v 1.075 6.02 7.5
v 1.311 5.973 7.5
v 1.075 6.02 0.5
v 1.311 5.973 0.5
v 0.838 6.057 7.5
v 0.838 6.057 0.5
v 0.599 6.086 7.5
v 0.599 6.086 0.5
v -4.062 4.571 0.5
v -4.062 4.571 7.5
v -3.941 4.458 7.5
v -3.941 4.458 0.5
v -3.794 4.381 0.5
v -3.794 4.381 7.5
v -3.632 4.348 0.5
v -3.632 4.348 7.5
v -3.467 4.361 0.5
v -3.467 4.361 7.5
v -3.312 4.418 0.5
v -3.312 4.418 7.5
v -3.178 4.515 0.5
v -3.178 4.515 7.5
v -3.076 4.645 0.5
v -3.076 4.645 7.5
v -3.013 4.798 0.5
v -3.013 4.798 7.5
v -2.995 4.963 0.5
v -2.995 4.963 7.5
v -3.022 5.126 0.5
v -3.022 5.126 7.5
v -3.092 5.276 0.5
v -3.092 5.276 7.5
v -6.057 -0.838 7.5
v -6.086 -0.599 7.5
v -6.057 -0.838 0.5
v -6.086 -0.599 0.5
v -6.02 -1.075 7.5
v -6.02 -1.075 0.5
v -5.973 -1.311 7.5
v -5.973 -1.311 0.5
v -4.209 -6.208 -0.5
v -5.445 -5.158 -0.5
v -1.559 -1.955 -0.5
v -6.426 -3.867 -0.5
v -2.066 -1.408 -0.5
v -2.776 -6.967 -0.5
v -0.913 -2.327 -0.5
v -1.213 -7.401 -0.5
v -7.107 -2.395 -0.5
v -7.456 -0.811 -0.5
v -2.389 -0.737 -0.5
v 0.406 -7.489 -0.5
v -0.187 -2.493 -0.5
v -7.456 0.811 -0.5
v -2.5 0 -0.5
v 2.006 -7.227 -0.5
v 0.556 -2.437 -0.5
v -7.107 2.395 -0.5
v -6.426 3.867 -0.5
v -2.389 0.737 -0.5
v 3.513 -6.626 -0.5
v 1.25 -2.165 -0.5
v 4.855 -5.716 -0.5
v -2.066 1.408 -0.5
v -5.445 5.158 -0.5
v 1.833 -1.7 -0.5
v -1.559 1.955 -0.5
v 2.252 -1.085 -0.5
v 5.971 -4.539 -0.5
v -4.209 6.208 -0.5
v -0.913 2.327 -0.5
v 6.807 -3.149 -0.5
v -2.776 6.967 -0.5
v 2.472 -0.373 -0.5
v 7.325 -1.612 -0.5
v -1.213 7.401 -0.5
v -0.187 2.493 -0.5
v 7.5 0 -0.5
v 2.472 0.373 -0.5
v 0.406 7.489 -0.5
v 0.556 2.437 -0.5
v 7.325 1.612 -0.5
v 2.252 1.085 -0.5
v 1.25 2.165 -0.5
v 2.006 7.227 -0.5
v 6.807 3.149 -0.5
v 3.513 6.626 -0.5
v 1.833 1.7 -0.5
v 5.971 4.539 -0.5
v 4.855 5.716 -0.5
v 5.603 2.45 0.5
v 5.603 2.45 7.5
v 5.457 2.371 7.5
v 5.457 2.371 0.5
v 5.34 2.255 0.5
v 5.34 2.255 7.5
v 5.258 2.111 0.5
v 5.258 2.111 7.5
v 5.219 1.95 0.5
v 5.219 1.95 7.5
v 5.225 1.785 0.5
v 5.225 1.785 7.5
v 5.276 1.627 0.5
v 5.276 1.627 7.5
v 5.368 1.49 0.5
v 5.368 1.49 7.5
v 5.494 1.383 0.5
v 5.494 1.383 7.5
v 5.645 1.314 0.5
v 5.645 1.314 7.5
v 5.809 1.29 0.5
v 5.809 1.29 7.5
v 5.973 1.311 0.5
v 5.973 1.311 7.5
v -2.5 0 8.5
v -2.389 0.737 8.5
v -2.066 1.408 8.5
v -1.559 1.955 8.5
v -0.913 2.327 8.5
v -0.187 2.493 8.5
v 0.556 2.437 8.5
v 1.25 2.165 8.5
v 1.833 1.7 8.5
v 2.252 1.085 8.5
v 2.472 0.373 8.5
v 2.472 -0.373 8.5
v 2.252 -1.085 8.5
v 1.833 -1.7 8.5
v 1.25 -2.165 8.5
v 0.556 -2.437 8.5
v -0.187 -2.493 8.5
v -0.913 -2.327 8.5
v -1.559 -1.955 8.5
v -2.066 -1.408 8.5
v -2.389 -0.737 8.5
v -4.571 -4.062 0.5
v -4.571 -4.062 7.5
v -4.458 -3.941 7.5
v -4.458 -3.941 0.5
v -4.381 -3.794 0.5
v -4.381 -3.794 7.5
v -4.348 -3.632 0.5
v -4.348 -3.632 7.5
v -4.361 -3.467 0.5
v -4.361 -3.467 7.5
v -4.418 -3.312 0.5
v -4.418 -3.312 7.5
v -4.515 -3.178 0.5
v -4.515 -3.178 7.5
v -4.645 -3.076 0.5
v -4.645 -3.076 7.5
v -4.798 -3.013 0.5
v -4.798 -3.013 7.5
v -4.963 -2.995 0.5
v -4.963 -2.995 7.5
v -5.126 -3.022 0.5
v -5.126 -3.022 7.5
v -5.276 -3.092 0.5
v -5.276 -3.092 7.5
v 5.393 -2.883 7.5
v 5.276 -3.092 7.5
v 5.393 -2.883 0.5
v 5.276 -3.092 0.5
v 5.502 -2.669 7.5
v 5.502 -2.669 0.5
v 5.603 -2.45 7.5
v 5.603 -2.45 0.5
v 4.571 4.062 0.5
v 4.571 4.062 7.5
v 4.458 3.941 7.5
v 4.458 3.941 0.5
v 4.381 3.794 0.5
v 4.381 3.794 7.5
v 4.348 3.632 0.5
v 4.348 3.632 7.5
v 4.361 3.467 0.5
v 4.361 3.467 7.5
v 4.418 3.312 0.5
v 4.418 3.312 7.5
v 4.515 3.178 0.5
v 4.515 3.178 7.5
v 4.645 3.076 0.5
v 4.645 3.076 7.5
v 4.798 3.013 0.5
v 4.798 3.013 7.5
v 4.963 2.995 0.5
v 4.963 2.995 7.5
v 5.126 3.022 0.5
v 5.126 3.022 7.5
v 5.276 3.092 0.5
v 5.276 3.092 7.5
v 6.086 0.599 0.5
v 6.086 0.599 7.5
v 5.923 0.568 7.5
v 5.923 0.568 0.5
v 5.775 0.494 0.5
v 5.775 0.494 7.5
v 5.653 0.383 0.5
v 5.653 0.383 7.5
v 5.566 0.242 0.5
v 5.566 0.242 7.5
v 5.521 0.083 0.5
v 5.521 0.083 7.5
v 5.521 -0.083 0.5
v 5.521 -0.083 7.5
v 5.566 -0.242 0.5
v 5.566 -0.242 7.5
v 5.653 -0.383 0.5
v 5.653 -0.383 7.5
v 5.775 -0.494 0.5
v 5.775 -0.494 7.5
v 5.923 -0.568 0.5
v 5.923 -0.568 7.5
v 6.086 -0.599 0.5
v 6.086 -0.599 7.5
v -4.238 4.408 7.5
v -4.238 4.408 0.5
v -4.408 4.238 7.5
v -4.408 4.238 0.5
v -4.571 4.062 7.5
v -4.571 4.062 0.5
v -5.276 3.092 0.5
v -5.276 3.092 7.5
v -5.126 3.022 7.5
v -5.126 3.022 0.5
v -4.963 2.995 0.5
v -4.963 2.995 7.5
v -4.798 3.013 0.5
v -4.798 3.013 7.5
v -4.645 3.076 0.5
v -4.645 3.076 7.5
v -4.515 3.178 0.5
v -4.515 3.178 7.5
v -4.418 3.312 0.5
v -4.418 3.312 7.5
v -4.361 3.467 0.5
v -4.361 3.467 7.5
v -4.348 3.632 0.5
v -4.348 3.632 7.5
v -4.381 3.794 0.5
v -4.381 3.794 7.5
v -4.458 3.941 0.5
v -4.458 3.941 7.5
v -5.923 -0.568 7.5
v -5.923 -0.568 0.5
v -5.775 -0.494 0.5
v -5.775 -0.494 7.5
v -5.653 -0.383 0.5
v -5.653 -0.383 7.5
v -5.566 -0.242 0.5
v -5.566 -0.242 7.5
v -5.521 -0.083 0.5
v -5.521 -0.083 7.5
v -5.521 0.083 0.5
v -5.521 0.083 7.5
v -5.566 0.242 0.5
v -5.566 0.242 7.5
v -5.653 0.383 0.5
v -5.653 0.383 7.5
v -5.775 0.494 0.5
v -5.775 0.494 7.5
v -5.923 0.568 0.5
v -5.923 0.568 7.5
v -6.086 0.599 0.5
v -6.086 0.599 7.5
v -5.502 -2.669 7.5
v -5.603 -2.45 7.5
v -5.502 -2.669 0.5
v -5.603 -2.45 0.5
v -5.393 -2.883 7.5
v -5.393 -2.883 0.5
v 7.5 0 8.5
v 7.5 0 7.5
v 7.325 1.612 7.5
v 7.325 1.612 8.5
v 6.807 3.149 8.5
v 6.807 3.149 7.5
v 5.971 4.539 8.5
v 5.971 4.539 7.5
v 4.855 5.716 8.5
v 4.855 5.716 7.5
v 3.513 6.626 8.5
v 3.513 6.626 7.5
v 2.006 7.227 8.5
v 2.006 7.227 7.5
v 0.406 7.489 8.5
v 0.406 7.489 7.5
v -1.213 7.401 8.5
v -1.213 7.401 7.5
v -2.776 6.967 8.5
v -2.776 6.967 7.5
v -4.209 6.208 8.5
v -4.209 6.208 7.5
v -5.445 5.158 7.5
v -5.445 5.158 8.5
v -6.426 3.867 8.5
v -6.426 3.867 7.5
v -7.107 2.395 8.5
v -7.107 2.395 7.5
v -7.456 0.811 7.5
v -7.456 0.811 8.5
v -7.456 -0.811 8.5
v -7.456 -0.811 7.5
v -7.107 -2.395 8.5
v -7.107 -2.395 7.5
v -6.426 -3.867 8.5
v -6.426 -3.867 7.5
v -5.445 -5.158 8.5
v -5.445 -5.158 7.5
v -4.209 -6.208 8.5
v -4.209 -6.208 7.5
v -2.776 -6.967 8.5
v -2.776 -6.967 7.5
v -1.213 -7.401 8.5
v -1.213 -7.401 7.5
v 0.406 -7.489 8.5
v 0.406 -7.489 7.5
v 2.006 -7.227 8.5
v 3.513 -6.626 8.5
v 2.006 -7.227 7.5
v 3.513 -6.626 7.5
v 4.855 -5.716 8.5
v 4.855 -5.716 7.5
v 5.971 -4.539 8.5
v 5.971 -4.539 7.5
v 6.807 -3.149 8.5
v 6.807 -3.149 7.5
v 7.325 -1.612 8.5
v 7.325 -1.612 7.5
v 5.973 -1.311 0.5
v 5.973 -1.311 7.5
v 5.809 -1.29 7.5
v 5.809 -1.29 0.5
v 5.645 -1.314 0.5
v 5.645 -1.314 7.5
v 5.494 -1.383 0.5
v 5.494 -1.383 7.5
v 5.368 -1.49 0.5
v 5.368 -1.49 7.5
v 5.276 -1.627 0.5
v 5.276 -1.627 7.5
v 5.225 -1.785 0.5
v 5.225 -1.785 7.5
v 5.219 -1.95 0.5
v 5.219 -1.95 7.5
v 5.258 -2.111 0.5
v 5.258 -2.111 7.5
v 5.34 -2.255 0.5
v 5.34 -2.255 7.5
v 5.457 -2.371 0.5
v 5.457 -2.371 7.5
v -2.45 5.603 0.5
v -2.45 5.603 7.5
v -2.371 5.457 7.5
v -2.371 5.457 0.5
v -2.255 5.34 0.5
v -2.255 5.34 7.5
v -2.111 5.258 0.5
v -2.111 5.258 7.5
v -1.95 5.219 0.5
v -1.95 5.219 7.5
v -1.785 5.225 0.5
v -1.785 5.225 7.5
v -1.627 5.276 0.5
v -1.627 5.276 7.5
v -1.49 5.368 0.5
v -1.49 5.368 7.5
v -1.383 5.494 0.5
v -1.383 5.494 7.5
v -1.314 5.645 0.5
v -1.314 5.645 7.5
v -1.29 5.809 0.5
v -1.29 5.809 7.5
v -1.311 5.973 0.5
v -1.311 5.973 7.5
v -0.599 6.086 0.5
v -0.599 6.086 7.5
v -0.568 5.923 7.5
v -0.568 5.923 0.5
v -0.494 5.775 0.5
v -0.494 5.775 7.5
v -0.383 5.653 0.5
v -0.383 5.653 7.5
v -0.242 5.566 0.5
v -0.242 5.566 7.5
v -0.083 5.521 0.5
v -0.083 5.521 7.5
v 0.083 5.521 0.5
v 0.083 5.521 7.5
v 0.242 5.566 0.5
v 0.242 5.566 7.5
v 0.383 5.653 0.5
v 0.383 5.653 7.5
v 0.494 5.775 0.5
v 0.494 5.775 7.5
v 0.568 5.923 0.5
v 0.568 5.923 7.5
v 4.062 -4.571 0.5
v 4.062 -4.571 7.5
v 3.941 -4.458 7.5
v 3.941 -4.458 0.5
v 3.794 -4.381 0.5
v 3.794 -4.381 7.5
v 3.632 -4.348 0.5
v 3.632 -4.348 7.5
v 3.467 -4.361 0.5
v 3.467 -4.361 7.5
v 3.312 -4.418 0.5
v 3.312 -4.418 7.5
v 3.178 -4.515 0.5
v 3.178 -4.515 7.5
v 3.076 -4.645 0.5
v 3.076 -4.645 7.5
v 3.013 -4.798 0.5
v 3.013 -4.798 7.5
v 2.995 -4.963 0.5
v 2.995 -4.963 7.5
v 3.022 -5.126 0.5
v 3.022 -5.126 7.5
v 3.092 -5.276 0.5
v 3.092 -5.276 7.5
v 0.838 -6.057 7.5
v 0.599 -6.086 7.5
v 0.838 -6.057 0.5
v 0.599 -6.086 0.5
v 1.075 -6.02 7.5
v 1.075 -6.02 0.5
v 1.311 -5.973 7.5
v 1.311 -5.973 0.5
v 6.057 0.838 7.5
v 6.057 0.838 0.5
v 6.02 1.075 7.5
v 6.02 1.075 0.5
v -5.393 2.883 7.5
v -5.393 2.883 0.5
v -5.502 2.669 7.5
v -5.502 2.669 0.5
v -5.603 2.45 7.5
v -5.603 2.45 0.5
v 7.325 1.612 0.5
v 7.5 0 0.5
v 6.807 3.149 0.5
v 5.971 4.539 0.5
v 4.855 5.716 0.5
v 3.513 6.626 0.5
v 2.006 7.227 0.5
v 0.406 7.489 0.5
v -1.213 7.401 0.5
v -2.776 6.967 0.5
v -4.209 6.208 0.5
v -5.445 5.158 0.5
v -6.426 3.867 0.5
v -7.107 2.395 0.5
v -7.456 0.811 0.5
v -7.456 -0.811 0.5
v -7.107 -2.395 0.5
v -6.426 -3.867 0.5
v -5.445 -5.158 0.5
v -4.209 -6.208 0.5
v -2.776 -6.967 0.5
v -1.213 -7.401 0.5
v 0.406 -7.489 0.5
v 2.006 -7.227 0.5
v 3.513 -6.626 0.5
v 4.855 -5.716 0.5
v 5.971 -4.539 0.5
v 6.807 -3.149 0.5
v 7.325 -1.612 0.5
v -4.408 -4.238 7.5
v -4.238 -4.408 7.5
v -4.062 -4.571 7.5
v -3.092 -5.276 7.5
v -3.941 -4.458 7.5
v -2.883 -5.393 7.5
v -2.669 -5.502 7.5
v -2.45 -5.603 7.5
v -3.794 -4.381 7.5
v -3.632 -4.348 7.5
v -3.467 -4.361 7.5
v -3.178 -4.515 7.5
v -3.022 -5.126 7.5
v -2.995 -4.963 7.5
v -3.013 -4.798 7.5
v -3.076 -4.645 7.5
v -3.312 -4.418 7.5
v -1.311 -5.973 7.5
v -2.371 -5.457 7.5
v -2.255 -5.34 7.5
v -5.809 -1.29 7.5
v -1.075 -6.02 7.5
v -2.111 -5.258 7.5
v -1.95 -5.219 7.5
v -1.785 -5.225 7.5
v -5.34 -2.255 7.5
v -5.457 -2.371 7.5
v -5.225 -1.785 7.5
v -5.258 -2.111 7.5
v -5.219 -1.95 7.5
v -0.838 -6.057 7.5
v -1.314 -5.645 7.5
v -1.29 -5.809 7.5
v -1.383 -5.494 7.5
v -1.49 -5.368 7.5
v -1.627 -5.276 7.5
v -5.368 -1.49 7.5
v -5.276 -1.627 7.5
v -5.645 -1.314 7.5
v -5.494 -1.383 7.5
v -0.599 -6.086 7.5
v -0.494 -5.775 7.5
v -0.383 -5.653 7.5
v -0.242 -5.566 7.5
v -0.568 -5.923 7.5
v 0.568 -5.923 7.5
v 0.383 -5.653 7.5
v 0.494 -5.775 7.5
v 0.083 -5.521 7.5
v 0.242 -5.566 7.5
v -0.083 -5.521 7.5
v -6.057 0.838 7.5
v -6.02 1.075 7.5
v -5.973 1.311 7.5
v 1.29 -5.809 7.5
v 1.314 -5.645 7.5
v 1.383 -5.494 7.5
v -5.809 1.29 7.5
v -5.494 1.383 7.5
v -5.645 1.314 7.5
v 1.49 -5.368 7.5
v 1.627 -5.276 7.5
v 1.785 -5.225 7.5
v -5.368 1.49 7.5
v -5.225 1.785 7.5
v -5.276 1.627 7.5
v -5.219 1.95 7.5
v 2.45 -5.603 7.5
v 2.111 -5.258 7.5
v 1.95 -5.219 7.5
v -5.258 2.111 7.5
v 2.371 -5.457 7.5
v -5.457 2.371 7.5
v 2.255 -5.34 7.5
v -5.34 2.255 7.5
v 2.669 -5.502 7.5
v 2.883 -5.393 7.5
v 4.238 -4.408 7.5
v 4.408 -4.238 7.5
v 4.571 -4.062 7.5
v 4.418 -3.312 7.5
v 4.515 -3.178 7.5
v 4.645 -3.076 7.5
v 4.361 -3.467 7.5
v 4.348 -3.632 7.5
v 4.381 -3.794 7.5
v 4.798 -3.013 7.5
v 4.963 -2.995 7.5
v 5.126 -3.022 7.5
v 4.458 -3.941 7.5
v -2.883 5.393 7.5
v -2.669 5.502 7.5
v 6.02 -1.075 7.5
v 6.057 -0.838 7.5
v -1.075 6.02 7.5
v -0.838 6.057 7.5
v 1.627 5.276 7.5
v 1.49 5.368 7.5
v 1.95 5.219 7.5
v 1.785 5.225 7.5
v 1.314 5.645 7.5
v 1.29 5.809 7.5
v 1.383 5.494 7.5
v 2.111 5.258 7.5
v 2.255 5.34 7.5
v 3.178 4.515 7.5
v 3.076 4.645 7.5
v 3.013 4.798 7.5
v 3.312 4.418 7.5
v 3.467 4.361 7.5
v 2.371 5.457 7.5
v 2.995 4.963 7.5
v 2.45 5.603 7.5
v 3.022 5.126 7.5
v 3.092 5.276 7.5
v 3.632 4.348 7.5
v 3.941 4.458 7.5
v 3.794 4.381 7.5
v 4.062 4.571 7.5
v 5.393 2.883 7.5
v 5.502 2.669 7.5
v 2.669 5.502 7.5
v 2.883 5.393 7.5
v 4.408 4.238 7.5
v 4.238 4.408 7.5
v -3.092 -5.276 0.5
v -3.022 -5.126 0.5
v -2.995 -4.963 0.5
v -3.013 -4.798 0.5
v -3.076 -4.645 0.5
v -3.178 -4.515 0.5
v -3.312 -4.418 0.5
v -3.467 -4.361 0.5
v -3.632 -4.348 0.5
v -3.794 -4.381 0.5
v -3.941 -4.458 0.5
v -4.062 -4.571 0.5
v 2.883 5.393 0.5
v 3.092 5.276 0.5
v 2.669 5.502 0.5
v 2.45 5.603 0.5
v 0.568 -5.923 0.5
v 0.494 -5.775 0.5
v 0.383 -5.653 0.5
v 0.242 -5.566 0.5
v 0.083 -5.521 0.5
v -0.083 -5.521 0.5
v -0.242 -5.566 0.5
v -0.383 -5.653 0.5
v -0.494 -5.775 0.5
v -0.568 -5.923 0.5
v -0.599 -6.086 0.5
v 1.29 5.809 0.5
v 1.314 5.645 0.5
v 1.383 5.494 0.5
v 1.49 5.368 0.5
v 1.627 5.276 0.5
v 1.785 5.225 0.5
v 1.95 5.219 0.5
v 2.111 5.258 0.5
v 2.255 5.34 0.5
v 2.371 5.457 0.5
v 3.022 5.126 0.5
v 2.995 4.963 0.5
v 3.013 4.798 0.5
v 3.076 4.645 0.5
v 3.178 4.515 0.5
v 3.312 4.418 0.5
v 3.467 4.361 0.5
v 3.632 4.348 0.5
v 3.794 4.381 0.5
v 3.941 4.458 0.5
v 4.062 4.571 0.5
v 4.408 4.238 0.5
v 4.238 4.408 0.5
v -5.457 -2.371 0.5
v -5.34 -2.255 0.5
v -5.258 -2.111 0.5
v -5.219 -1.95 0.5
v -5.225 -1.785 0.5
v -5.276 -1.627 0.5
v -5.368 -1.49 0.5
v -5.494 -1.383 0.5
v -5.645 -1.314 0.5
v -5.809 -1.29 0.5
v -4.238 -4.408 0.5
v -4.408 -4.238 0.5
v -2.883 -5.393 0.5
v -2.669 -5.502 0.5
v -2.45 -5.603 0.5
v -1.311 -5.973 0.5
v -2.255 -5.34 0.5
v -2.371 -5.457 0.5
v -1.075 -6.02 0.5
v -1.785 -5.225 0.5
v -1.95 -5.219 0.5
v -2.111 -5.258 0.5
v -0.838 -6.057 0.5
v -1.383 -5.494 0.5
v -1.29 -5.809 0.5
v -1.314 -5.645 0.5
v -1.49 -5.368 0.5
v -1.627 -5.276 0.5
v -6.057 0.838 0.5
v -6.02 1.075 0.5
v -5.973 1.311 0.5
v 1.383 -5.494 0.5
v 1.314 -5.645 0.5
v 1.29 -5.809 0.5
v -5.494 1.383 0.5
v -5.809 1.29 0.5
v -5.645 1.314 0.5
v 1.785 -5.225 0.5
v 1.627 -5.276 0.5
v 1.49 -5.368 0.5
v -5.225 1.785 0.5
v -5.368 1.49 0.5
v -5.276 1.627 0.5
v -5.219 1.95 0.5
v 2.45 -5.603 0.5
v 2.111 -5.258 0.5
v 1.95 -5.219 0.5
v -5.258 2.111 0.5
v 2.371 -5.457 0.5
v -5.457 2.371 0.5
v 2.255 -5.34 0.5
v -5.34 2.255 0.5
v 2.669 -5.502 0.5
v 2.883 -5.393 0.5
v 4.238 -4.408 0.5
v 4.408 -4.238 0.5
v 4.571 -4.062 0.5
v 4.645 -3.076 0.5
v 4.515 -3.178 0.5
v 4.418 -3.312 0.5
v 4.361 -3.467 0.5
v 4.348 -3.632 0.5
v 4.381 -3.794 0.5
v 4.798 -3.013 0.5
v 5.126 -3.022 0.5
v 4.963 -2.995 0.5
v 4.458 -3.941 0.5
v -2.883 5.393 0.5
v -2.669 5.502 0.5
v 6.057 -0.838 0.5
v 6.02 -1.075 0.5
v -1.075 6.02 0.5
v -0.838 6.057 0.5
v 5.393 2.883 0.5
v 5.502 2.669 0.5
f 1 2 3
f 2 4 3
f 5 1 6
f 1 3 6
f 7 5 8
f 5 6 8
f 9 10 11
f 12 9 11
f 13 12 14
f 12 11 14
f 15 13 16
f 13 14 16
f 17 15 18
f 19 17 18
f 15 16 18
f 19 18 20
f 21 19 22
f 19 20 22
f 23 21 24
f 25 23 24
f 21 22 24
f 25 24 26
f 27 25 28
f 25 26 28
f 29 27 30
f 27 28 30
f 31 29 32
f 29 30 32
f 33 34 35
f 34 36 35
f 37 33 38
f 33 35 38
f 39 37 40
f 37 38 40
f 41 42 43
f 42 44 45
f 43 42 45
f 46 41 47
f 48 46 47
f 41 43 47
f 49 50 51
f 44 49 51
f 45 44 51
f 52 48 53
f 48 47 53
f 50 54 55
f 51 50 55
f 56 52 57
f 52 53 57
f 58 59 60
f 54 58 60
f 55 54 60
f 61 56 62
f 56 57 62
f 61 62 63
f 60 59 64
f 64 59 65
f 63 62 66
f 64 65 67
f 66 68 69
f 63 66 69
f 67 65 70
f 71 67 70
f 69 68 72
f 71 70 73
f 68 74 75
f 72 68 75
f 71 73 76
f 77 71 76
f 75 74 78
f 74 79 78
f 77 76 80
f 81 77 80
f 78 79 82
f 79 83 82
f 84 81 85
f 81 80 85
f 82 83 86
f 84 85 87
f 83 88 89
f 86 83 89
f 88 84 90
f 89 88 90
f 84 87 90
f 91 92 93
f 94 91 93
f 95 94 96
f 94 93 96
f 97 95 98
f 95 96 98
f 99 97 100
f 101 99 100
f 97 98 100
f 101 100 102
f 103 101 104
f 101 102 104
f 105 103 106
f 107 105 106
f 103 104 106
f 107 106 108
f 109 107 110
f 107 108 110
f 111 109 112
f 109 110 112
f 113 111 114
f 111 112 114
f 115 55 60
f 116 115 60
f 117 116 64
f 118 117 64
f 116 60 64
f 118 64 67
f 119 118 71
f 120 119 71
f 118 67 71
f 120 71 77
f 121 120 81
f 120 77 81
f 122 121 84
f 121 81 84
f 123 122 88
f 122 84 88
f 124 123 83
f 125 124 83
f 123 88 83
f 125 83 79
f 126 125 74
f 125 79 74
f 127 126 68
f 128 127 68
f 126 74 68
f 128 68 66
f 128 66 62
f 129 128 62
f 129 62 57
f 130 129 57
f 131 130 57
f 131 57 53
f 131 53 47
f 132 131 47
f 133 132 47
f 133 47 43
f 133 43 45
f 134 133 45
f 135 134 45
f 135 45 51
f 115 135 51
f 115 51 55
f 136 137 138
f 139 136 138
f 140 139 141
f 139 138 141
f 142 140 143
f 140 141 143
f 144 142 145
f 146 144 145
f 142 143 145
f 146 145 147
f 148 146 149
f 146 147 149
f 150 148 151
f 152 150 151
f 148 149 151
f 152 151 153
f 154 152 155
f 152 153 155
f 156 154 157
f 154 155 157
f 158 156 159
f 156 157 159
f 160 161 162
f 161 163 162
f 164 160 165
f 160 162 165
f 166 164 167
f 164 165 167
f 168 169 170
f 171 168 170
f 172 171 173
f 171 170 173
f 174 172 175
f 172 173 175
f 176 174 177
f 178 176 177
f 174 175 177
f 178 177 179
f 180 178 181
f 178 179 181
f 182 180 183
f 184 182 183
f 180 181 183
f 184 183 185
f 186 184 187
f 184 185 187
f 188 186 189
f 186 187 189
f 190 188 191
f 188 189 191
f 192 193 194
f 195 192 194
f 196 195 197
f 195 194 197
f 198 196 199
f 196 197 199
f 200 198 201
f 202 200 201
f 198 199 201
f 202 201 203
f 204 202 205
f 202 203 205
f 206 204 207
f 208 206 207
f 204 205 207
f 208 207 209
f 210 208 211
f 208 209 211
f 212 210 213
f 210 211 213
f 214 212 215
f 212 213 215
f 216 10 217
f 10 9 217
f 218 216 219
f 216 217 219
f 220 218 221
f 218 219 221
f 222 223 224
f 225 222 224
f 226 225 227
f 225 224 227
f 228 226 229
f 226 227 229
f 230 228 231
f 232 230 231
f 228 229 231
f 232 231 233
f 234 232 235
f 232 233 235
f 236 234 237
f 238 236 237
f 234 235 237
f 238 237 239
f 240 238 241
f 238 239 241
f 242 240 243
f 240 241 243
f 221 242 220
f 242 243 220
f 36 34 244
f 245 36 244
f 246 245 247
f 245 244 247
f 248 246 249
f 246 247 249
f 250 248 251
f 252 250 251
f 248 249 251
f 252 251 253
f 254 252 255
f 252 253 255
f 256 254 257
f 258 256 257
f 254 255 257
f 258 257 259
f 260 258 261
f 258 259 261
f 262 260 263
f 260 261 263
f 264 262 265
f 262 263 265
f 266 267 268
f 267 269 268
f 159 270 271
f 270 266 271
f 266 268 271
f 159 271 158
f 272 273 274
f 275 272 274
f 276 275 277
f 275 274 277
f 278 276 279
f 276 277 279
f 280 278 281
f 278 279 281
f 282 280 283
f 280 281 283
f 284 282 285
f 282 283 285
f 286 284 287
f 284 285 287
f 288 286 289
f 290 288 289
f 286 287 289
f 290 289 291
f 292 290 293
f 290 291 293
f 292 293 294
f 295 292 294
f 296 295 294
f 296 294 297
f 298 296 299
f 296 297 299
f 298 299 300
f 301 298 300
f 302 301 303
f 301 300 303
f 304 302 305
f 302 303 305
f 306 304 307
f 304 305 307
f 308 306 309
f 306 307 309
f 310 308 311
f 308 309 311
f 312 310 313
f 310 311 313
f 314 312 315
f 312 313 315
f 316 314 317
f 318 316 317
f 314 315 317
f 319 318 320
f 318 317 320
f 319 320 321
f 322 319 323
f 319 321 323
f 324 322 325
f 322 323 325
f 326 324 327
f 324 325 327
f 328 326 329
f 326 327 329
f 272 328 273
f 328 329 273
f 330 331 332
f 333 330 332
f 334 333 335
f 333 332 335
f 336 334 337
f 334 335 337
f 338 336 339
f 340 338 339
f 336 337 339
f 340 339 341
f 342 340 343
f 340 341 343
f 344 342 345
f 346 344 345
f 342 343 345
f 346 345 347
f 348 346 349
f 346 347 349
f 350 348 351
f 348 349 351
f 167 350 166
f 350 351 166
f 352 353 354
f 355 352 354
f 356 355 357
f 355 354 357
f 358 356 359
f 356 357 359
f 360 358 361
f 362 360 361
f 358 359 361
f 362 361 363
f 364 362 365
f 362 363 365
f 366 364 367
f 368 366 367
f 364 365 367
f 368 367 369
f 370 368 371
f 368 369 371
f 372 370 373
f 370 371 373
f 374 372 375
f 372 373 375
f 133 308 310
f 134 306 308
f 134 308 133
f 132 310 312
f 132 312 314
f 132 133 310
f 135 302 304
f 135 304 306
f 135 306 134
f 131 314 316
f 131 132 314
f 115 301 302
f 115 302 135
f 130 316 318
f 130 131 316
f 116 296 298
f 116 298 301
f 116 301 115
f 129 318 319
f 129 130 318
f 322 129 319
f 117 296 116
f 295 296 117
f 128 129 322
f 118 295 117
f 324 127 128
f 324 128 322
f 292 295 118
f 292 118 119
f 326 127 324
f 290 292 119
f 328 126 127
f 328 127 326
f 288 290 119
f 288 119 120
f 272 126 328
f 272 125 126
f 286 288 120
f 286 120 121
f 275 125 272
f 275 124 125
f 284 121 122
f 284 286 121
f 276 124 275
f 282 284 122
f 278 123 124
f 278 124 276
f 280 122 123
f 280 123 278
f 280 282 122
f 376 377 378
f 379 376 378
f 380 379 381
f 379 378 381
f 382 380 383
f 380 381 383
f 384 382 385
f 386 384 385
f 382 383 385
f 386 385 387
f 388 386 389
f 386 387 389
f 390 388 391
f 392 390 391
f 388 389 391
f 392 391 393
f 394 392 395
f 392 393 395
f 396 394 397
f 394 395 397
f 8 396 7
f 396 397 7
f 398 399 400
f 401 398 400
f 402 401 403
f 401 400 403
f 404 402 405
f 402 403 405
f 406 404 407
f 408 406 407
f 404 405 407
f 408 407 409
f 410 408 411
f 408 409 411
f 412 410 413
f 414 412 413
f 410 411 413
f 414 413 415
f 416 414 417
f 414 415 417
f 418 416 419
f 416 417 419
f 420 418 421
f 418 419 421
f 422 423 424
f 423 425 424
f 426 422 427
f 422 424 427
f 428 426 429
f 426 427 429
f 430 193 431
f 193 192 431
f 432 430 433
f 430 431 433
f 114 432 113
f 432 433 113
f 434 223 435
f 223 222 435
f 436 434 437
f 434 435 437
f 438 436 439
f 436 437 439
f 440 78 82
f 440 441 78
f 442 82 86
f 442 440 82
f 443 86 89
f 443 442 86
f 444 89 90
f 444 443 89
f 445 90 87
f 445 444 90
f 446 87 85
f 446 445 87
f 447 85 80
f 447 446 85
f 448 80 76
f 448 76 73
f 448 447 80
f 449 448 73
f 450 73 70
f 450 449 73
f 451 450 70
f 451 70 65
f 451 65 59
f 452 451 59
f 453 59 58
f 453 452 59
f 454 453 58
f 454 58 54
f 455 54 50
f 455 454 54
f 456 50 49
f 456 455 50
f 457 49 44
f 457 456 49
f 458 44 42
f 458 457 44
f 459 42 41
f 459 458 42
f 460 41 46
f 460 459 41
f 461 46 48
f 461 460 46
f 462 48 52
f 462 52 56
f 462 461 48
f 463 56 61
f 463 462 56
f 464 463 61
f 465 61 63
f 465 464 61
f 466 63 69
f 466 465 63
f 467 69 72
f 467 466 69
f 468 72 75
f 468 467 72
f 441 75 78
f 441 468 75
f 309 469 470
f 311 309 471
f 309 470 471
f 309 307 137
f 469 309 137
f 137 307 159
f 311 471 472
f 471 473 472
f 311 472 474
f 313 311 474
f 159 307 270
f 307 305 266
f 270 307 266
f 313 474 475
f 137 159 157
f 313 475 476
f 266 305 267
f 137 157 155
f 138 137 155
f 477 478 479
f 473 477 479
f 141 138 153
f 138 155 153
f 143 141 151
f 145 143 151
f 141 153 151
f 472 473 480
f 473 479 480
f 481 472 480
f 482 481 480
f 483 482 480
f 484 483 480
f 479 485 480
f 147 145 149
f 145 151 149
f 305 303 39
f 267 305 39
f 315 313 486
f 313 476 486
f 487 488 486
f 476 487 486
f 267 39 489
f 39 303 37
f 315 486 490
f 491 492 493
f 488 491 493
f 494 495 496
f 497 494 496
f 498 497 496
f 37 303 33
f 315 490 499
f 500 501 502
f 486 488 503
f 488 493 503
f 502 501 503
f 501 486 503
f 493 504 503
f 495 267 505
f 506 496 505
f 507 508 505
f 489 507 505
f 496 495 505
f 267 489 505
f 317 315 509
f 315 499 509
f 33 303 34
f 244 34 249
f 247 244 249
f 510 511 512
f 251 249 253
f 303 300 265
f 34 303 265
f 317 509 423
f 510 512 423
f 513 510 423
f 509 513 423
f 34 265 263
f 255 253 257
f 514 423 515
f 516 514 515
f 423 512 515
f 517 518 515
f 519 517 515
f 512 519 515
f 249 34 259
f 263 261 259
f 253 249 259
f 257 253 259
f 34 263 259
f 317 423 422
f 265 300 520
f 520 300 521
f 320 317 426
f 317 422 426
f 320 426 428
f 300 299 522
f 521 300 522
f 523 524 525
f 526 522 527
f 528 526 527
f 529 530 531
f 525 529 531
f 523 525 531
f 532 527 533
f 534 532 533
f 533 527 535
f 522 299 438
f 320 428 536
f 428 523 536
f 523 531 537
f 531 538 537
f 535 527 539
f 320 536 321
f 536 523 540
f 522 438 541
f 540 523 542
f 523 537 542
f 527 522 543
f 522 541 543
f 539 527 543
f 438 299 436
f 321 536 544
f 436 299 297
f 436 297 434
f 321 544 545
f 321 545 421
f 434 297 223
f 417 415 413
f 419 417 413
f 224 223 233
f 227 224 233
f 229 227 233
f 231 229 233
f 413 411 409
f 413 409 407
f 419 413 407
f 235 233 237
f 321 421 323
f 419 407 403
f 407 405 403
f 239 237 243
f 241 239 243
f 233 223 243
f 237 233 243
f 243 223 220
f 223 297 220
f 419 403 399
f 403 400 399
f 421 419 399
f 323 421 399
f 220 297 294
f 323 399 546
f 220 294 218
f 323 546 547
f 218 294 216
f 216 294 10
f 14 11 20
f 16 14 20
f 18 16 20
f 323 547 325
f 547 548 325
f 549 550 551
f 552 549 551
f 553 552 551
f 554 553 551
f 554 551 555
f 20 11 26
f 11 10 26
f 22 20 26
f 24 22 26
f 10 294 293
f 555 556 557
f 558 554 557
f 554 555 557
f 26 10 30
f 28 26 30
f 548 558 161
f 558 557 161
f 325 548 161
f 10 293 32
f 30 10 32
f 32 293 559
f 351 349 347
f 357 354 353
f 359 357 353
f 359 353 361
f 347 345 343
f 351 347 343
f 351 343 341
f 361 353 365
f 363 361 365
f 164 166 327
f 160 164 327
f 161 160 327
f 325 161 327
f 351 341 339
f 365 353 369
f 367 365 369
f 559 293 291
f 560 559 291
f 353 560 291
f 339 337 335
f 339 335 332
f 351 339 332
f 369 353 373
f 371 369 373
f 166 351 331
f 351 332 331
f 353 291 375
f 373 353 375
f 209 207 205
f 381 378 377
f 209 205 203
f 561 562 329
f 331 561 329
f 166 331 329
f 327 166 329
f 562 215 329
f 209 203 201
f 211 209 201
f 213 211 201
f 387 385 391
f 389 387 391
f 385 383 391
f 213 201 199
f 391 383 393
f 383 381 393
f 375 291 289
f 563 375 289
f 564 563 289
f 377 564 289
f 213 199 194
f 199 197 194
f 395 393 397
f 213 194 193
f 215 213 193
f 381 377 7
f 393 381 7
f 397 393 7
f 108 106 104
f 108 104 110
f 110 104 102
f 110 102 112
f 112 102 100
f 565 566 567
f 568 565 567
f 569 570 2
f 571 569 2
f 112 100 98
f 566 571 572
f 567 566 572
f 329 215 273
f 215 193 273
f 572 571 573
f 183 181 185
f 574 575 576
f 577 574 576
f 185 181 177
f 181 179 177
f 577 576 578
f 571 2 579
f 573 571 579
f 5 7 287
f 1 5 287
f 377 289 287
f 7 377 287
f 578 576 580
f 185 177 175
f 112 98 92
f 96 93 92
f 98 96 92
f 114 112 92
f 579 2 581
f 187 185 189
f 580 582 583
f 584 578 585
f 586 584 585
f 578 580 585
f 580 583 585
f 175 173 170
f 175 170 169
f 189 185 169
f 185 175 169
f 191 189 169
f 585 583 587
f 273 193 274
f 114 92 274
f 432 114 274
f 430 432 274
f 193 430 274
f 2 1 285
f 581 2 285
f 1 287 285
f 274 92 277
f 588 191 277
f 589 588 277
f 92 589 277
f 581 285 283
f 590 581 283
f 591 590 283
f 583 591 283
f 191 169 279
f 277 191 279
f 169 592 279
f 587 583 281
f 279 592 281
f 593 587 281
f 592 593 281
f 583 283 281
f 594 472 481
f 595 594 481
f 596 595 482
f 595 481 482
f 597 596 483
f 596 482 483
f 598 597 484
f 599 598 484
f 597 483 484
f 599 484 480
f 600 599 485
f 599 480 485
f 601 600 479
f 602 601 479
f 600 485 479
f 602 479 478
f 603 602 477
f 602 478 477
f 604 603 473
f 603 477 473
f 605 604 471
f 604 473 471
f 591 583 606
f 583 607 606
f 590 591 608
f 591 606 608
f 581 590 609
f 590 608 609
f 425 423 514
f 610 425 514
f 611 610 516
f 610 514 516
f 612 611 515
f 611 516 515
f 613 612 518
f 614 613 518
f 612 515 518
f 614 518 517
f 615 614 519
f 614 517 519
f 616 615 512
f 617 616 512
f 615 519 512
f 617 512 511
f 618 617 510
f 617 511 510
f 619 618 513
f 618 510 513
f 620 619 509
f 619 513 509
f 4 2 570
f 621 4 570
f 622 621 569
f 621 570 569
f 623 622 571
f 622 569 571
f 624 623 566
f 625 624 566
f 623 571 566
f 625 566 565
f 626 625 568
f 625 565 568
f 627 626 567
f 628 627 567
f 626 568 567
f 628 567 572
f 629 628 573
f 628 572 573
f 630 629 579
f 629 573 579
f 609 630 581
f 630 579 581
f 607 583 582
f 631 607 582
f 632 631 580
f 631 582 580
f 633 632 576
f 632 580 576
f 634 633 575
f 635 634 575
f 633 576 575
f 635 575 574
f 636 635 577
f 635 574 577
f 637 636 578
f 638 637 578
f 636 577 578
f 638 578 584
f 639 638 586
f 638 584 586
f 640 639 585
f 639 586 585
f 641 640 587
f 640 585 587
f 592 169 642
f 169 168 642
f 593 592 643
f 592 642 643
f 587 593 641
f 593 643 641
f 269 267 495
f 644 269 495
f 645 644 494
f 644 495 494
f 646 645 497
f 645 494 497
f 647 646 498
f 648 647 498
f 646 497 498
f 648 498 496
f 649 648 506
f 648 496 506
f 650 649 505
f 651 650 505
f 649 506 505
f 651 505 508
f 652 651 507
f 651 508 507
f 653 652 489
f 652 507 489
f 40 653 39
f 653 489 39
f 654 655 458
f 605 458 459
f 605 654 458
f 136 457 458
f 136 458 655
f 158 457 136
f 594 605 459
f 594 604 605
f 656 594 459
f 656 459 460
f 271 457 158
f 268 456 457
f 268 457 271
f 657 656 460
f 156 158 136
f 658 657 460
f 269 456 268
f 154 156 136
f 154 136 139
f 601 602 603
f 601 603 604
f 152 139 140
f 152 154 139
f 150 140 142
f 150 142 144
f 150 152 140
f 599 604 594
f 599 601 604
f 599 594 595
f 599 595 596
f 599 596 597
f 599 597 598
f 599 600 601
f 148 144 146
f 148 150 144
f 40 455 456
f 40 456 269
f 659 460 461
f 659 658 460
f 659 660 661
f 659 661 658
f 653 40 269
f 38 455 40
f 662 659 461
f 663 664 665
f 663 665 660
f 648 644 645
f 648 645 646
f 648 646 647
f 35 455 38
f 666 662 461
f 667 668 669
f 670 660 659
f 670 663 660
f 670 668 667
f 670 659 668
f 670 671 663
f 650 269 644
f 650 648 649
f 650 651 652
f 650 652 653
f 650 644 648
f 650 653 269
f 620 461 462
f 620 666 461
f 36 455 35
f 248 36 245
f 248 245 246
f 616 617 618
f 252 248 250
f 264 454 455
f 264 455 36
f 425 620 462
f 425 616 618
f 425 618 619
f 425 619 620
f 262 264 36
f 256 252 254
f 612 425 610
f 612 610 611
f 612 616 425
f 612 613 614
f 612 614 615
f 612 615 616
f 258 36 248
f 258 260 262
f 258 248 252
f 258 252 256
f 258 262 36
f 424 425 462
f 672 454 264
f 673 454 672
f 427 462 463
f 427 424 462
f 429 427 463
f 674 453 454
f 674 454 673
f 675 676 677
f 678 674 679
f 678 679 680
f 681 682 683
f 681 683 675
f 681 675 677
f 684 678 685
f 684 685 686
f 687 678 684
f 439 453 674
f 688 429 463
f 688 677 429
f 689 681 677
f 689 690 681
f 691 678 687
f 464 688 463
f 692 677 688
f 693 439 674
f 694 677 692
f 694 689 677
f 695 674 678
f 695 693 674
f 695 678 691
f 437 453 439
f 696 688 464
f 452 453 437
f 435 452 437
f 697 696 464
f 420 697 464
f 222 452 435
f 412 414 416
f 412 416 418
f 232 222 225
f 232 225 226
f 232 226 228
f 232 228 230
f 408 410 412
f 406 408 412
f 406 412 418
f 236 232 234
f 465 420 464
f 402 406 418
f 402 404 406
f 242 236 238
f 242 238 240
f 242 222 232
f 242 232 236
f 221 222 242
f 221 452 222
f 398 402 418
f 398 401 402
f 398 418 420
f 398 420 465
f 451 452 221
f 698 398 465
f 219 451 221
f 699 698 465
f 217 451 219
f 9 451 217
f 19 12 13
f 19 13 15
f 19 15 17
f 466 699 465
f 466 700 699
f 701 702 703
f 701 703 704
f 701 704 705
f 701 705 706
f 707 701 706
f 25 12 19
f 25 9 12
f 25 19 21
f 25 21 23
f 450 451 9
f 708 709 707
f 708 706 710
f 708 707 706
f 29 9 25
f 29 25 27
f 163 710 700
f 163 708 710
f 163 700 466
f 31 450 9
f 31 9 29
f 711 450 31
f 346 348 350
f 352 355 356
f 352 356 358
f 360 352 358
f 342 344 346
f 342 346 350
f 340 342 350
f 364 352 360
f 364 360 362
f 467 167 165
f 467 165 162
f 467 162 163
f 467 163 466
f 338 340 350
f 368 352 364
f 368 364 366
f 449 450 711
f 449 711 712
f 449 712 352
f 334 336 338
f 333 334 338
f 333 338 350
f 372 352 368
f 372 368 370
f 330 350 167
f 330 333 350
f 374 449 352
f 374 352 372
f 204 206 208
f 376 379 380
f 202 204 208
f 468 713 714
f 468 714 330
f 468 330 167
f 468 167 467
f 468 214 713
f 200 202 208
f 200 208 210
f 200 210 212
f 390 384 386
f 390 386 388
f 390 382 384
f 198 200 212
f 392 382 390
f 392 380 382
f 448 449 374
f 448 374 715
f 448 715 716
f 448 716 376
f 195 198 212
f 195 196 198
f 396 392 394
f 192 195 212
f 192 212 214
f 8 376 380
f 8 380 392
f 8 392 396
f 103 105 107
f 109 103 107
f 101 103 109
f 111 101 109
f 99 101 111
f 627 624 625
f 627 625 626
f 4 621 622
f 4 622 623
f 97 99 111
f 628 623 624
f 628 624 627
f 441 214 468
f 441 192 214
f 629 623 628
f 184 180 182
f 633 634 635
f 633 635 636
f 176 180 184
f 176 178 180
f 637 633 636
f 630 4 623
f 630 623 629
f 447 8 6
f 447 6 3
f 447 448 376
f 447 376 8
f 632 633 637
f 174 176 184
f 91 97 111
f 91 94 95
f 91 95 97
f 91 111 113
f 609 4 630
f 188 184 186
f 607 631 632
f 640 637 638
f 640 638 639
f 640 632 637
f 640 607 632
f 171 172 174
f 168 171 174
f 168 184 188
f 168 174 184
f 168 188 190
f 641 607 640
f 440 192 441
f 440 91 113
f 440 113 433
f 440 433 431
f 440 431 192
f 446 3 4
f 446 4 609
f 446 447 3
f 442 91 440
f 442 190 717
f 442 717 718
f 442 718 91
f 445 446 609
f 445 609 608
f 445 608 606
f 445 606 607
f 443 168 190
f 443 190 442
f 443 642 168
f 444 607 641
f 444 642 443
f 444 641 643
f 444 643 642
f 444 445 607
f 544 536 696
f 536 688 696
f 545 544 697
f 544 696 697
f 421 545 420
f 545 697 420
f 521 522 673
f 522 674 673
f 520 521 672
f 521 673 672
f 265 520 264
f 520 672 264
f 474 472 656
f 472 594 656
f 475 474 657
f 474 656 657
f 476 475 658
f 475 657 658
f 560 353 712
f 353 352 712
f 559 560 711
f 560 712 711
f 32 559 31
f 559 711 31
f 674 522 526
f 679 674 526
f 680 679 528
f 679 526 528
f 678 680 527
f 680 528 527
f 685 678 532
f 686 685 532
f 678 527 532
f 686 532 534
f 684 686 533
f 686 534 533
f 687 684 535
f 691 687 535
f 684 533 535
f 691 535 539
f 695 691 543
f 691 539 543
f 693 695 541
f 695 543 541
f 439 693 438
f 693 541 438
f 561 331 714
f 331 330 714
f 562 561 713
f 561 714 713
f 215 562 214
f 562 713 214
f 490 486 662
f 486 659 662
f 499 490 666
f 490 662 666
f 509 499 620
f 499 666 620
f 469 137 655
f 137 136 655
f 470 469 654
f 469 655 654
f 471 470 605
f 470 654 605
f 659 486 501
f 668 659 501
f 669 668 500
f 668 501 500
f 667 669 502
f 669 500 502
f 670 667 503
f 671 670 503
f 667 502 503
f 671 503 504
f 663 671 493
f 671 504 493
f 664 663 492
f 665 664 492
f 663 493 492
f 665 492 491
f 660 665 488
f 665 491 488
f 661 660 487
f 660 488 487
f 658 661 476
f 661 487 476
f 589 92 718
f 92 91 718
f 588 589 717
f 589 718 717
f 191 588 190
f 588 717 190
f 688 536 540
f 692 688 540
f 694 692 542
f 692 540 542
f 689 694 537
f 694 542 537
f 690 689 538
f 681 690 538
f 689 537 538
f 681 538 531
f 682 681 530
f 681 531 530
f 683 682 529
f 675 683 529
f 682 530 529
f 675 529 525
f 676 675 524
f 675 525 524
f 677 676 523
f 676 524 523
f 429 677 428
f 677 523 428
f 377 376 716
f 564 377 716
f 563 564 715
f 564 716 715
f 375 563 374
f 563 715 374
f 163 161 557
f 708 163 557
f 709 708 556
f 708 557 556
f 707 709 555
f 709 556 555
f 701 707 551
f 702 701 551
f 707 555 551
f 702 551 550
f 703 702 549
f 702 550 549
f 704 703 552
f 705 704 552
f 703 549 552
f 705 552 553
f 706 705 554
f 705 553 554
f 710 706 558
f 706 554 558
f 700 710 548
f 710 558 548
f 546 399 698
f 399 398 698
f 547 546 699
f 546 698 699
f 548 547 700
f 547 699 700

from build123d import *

# Parameters (mm, degrees)
SKETCH_1_R               = 7.5
EXTRUDE_1_DEPTH          = 0.5
SKETCH_2_R               = 6.115
EXTRUDE_2_DEPTH          = 7
CUT_EXTRUDE_3_DEPTH      = 7
SKETCH_3_R               = 7.5
EXTRUDE_3_DEPTH          = 1
SKETCH_6_R               = 2.5
CUT_EXTRUDE_2_DEPTH      = 10
PATTERN_CIRCULAR_2_COUNT = 20


with BuildPart() as part:
    # 草圖1 → 填料-伸長1 (new body, symmetric)
    with BuildSketch(Plane.XY):
        Circle(SKETCH_1_R)
    extrude(amount=EXTRUDE_1_DEPTH, both=True)

    # 草圖2 → 填料-伸長2 (add)
    with BuildSketch(Plane.XY.offset(0.5)):
        Circle(SKETCH_2_R)
    extrude(amount=EXTRUDE_2_DEPTH)

    # 草圖7 → 除料-伸長3 (cut)
    with BuildSketch(Plane.XY.offset(7.5)):
        with BuildLine():
            ThreePointArc((-0.599277509, 6.085564186), (0, 5.515), (0.599277509, 6.085564186))
            ThreePointArc((0.599277509, 6.085564186), (0, 6.115), (-0.599277509, 6.085564186))
        make_face()
    cut_extrude_3 = extrude(amount=-CUT_EXTRUDE_3_DEPTH, mode=Mode.SUBTRACT)

    # 草圖3 → 填料-伸長3 (add)
    with BuildSketch(Plane.XY.offset(7.5)):
        Circle(SKETCH_3_R)
    extrude(amount=EXTRUDE_3_DEPTH)

    # 草圖6 → 除料-伸長2 (cut, through all)
    with BuildSketch(Plane(origin=(0, 0, -0.5), x_dir=(-1, 0, 0), z_dir=(0, 0, -1))):
        Circle(SKETCH_6_R)
    extrude(amount=-CUT_EXTRUDE_2_DEPTH, mode=Mode.SUBTRACT)

    # 環狀複製排列2: 除料-伸長3 ×20 about axis
    pattern_circular_2_axis = Axis((0, 0, 0), (0, 0, 1))
    for i in range(1, PATTERN_CIRCULAR_2_COUNT):
        add(cut_extrude_3.rotate(pattern_circular_2_axis, i * 360 / PATTERN_CIRCULAR_2_COUNT), mode=Mode.SUBTRACT)


solid = part.part
